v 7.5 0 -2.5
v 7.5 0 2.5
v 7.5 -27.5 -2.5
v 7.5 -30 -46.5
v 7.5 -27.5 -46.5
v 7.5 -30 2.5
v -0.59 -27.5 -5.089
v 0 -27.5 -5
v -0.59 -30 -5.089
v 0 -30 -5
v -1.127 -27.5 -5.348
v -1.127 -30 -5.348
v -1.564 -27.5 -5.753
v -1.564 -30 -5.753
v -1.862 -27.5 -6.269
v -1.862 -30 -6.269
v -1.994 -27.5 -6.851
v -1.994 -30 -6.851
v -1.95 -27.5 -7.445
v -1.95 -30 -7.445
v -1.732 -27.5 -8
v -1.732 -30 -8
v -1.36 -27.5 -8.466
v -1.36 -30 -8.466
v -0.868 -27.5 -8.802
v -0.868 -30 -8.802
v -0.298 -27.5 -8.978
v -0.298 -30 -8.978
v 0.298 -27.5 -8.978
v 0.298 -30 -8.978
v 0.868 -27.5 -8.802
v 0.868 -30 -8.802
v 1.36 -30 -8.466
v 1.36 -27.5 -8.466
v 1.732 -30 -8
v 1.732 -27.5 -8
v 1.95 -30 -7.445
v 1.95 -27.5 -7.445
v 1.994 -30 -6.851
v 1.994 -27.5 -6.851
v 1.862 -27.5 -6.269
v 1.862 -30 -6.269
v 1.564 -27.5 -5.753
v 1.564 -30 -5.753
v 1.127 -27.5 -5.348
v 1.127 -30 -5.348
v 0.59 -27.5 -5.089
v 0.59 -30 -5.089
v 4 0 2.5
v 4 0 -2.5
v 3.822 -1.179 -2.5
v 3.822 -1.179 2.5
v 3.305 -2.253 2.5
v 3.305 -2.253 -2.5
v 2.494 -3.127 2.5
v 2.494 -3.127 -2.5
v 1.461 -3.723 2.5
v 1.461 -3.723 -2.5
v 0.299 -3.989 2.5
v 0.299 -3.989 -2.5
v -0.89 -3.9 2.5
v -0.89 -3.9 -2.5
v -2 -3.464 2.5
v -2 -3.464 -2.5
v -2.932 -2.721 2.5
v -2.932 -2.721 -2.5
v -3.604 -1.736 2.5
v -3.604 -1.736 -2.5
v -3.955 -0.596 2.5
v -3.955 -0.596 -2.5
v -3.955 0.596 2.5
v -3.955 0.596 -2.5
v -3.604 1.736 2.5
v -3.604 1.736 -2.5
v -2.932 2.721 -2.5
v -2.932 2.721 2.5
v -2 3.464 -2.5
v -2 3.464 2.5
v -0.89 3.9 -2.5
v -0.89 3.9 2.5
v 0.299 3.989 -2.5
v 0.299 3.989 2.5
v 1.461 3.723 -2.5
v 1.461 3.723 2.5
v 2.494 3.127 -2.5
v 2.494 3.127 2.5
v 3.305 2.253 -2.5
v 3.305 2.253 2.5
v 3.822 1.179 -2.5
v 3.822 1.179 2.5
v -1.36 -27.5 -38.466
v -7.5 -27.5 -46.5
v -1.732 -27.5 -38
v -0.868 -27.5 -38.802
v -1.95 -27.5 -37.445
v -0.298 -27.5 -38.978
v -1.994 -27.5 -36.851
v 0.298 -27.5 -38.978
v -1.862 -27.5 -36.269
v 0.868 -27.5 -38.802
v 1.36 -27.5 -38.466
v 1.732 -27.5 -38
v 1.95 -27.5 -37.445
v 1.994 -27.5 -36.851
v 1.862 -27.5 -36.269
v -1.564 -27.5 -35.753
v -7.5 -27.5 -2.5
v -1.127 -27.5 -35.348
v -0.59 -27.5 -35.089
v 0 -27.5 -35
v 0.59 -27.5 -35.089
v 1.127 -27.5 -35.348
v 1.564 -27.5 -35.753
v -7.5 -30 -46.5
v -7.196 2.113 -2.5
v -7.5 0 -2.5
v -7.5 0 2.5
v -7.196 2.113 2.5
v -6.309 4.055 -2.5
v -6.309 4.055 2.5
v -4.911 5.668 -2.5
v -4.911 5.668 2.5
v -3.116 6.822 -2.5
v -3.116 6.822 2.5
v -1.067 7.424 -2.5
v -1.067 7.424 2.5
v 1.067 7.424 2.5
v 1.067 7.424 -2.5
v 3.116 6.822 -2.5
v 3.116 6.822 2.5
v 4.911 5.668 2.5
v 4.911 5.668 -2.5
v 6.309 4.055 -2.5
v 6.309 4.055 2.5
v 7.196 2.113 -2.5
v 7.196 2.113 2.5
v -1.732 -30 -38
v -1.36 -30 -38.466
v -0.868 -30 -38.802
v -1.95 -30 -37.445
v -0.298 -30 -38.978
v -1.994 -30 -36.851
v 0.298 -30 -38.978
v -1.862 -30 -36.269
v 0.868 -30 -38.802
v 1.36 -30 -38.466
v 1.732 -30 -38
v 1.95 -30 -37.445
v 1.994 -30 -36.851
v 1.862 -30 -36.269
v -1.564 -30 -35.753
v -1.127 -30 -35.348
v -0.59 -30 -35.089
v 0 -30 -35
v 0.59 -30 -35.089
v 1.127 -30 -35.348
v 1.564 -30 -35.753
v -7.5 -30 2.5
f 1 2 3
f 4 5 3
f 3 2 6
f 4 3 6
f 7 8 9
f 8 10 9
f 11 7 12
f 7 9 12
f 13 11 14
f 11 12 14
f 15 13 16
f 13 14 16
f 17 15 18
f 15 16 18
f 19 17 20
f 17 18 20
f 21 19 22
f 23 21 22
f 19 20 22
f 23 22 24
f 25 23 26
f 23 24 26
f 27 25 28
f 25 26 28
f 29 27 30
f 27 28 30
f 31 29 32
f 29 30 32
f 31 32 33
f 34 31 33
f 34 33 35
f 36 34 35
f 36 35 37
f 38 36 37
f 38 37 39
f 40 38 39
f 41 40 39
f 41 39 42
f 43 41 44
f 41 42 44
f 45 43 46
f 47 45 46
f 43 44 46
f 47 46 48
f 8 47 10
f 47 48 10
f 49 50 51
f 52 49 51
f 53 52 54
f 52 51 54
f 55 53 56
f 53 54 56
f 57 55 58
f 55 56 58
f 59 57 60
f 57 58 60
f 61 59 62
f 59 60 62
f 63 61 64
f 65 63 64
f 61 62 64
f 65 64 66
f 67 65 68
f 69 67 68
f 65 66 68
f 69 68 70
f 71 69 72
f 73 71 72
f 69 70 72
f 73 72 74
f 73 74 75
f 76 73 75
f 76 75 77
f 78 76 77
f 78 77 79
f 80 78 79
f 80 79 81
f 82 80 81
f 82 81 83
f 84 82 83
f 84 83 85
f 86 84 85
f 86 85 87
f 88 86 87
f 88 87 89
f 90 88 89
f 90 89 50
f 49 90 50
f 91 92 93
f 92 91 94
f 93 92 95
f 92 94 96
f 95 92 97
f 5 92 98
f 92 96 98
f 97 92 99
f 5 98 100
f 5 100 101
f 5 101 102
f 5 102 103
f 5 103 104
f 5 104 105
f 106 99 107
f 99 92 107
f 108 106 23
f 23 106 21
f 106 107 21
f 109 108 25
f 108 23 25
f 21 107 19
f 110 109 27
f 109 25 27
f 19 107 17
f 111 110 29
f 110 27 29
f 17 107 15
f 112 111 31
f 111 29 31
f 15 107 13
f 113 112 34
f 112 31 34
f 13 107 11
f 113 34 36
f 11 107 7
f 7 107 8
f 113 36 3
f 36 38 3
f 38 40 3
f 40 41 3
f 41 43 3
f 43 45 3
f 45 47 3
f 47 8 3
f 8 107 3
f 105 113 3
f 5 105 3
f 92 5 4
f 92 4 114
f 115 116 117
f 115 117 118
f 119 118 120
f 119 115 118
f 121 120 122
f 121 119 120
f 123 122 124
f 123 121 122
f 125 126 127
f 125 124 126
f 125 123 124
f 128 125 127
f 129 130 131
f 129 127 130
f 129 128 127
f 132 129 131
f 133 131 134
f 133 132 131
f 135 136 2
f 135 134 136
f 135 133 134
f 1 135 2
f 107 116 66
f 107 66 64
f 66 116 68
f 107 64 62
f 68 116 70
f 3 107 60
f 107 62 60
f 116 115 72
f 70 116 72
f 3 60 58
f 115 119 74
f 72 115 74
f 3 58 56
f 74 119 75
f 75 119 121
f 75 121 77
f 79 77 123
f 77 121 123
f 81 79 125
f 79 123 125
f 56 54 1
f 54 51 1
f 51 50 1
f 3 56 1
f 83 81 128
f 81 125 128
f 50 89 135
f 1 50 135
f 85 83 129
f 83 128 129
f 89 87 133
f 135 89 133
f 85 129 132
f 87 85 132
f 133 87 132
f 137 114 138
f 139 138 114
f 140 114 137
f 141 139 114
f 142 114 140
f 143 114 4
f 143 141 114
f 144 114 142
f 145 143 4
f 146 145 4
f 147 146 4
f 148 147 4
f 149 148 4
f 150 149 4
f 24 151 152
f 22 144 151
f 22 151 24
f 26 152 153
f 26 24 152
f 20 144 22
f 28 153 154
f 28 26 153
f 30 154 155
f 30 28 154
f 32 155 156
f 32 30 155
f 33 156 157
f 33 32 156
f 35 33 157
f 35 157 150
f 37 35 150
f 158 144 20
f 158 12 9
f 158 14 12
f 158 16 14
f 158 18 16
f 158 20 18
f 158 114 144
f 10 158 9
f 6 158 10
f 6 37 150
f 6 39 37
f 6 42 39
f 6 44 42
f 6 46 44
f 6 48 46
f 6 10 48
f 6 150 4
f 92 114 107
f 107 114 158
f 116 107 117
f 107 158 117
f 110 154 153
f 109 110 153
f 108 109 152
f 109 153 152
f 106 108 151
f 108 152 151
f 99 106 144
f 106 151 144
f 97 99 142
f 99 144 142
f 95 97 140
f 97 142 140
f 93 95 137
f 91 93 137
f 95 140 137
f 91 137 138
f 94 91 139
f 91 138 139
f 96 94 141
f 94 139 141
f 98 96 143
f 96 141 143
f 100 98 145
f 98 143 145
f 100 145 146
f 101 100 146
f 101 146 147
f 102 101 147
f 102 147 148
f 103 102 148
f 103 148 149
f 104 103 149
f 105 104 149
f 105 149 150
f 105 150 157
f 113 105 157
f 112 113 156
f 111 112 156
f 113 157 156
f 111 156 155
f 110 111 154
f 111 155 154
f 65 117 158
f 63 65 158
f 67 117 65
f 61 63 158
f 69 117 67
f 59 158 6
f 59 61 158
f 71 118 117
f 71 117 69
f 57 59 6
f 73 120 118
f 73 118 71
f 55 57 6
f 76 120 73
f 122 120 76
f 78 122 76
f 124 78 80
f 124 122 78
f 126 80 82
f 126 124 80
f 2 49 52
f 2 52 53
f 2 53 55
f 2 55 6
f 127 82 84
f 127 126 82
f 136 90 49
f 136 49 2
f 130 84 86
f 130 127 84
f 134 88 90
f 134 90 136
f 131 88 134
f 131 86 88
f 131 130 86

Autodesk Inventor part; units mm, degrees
ref_plane "YZ Plane" through (0, 0, 0) normal (1, 0, 0) x (0, 1, 0)
ref_plane "XZ Plane" through (0, 0, 0) normal (0, 1, 0) x (-1, 0, 0)
ref_plane "XY Plane" through (0, 0, 0) normal (0, 0, 1) x (1, 0, 0)
sketch "Sketch1" plane through (0, 0, 0) normal (0, 0, 1) x (1, 0, 0)
  circle A0 centre (0, 0) radius 4
  arc A1 (7.5, 0) -> (-7.5, 0) centre (0, 0) ccw
  line L0 (-7.5, 0) -> (7.5, 0)
  line L1 (7.5, 0) -> (7.5, -30)
  line L2 (7.5, -30) -> (-7.5, -30)
  line L3 (-7.5, -30) -> (-7.5, 0)
  dimension "d0" = 8
  dimension "d1" = 15
  dimension "d2" = 15
  dimension "d3" = 30
extrude "Extrusion1" add sketch "Sketch1" along normal mid plane 5 contours L0 L1 L2 L3 A0 | A0 L0 A1
sketch "Sketch2" plane through (0, 0, -2.5) normal (0, 0, -1) x (-1, 0, 0)
  line L0 (7.5, -30) -> (-7.5, -30) projected
  line L1 (-7.5, -30) -> (7.5, -30)
  line L2 (7.5, -30) -> (7.5, -27.5)
  line L3 (7.5, -27.5) -> (-7.5, -27.5)
  line L4 (-7.5, -27.5) -> (-7.5, -30)
  point P0 (0, 0)
  point P1 (7.5, -30)
  dimension "d6" = 15
  dimension "d7" = 2.5
extrude "Extrusion2" add sketch "Sketch2" along normal blind 44
sketch "Sketch3" plane through (-7.5, -27.5, -2.5) normal (0, 1, 0) x (1, 0, 0)
  line L0 (0, -5) -> (15, -5) projected
  line L1 (7.5, -5) -> (7.5, 4.5)
  line L2 (7.5, 4.5) -> (7.5, 34.5)
  point P0 (7.5, -2.5)
  dimension "d10" = 9.5
  dimension "d11" = 30
hole "Hole1" at (0, -27.5, -7) at (0, -27.5, -37) direction (0, -1, 0) diameter 4 depth 6
properties part number "Half Bearing Block"
